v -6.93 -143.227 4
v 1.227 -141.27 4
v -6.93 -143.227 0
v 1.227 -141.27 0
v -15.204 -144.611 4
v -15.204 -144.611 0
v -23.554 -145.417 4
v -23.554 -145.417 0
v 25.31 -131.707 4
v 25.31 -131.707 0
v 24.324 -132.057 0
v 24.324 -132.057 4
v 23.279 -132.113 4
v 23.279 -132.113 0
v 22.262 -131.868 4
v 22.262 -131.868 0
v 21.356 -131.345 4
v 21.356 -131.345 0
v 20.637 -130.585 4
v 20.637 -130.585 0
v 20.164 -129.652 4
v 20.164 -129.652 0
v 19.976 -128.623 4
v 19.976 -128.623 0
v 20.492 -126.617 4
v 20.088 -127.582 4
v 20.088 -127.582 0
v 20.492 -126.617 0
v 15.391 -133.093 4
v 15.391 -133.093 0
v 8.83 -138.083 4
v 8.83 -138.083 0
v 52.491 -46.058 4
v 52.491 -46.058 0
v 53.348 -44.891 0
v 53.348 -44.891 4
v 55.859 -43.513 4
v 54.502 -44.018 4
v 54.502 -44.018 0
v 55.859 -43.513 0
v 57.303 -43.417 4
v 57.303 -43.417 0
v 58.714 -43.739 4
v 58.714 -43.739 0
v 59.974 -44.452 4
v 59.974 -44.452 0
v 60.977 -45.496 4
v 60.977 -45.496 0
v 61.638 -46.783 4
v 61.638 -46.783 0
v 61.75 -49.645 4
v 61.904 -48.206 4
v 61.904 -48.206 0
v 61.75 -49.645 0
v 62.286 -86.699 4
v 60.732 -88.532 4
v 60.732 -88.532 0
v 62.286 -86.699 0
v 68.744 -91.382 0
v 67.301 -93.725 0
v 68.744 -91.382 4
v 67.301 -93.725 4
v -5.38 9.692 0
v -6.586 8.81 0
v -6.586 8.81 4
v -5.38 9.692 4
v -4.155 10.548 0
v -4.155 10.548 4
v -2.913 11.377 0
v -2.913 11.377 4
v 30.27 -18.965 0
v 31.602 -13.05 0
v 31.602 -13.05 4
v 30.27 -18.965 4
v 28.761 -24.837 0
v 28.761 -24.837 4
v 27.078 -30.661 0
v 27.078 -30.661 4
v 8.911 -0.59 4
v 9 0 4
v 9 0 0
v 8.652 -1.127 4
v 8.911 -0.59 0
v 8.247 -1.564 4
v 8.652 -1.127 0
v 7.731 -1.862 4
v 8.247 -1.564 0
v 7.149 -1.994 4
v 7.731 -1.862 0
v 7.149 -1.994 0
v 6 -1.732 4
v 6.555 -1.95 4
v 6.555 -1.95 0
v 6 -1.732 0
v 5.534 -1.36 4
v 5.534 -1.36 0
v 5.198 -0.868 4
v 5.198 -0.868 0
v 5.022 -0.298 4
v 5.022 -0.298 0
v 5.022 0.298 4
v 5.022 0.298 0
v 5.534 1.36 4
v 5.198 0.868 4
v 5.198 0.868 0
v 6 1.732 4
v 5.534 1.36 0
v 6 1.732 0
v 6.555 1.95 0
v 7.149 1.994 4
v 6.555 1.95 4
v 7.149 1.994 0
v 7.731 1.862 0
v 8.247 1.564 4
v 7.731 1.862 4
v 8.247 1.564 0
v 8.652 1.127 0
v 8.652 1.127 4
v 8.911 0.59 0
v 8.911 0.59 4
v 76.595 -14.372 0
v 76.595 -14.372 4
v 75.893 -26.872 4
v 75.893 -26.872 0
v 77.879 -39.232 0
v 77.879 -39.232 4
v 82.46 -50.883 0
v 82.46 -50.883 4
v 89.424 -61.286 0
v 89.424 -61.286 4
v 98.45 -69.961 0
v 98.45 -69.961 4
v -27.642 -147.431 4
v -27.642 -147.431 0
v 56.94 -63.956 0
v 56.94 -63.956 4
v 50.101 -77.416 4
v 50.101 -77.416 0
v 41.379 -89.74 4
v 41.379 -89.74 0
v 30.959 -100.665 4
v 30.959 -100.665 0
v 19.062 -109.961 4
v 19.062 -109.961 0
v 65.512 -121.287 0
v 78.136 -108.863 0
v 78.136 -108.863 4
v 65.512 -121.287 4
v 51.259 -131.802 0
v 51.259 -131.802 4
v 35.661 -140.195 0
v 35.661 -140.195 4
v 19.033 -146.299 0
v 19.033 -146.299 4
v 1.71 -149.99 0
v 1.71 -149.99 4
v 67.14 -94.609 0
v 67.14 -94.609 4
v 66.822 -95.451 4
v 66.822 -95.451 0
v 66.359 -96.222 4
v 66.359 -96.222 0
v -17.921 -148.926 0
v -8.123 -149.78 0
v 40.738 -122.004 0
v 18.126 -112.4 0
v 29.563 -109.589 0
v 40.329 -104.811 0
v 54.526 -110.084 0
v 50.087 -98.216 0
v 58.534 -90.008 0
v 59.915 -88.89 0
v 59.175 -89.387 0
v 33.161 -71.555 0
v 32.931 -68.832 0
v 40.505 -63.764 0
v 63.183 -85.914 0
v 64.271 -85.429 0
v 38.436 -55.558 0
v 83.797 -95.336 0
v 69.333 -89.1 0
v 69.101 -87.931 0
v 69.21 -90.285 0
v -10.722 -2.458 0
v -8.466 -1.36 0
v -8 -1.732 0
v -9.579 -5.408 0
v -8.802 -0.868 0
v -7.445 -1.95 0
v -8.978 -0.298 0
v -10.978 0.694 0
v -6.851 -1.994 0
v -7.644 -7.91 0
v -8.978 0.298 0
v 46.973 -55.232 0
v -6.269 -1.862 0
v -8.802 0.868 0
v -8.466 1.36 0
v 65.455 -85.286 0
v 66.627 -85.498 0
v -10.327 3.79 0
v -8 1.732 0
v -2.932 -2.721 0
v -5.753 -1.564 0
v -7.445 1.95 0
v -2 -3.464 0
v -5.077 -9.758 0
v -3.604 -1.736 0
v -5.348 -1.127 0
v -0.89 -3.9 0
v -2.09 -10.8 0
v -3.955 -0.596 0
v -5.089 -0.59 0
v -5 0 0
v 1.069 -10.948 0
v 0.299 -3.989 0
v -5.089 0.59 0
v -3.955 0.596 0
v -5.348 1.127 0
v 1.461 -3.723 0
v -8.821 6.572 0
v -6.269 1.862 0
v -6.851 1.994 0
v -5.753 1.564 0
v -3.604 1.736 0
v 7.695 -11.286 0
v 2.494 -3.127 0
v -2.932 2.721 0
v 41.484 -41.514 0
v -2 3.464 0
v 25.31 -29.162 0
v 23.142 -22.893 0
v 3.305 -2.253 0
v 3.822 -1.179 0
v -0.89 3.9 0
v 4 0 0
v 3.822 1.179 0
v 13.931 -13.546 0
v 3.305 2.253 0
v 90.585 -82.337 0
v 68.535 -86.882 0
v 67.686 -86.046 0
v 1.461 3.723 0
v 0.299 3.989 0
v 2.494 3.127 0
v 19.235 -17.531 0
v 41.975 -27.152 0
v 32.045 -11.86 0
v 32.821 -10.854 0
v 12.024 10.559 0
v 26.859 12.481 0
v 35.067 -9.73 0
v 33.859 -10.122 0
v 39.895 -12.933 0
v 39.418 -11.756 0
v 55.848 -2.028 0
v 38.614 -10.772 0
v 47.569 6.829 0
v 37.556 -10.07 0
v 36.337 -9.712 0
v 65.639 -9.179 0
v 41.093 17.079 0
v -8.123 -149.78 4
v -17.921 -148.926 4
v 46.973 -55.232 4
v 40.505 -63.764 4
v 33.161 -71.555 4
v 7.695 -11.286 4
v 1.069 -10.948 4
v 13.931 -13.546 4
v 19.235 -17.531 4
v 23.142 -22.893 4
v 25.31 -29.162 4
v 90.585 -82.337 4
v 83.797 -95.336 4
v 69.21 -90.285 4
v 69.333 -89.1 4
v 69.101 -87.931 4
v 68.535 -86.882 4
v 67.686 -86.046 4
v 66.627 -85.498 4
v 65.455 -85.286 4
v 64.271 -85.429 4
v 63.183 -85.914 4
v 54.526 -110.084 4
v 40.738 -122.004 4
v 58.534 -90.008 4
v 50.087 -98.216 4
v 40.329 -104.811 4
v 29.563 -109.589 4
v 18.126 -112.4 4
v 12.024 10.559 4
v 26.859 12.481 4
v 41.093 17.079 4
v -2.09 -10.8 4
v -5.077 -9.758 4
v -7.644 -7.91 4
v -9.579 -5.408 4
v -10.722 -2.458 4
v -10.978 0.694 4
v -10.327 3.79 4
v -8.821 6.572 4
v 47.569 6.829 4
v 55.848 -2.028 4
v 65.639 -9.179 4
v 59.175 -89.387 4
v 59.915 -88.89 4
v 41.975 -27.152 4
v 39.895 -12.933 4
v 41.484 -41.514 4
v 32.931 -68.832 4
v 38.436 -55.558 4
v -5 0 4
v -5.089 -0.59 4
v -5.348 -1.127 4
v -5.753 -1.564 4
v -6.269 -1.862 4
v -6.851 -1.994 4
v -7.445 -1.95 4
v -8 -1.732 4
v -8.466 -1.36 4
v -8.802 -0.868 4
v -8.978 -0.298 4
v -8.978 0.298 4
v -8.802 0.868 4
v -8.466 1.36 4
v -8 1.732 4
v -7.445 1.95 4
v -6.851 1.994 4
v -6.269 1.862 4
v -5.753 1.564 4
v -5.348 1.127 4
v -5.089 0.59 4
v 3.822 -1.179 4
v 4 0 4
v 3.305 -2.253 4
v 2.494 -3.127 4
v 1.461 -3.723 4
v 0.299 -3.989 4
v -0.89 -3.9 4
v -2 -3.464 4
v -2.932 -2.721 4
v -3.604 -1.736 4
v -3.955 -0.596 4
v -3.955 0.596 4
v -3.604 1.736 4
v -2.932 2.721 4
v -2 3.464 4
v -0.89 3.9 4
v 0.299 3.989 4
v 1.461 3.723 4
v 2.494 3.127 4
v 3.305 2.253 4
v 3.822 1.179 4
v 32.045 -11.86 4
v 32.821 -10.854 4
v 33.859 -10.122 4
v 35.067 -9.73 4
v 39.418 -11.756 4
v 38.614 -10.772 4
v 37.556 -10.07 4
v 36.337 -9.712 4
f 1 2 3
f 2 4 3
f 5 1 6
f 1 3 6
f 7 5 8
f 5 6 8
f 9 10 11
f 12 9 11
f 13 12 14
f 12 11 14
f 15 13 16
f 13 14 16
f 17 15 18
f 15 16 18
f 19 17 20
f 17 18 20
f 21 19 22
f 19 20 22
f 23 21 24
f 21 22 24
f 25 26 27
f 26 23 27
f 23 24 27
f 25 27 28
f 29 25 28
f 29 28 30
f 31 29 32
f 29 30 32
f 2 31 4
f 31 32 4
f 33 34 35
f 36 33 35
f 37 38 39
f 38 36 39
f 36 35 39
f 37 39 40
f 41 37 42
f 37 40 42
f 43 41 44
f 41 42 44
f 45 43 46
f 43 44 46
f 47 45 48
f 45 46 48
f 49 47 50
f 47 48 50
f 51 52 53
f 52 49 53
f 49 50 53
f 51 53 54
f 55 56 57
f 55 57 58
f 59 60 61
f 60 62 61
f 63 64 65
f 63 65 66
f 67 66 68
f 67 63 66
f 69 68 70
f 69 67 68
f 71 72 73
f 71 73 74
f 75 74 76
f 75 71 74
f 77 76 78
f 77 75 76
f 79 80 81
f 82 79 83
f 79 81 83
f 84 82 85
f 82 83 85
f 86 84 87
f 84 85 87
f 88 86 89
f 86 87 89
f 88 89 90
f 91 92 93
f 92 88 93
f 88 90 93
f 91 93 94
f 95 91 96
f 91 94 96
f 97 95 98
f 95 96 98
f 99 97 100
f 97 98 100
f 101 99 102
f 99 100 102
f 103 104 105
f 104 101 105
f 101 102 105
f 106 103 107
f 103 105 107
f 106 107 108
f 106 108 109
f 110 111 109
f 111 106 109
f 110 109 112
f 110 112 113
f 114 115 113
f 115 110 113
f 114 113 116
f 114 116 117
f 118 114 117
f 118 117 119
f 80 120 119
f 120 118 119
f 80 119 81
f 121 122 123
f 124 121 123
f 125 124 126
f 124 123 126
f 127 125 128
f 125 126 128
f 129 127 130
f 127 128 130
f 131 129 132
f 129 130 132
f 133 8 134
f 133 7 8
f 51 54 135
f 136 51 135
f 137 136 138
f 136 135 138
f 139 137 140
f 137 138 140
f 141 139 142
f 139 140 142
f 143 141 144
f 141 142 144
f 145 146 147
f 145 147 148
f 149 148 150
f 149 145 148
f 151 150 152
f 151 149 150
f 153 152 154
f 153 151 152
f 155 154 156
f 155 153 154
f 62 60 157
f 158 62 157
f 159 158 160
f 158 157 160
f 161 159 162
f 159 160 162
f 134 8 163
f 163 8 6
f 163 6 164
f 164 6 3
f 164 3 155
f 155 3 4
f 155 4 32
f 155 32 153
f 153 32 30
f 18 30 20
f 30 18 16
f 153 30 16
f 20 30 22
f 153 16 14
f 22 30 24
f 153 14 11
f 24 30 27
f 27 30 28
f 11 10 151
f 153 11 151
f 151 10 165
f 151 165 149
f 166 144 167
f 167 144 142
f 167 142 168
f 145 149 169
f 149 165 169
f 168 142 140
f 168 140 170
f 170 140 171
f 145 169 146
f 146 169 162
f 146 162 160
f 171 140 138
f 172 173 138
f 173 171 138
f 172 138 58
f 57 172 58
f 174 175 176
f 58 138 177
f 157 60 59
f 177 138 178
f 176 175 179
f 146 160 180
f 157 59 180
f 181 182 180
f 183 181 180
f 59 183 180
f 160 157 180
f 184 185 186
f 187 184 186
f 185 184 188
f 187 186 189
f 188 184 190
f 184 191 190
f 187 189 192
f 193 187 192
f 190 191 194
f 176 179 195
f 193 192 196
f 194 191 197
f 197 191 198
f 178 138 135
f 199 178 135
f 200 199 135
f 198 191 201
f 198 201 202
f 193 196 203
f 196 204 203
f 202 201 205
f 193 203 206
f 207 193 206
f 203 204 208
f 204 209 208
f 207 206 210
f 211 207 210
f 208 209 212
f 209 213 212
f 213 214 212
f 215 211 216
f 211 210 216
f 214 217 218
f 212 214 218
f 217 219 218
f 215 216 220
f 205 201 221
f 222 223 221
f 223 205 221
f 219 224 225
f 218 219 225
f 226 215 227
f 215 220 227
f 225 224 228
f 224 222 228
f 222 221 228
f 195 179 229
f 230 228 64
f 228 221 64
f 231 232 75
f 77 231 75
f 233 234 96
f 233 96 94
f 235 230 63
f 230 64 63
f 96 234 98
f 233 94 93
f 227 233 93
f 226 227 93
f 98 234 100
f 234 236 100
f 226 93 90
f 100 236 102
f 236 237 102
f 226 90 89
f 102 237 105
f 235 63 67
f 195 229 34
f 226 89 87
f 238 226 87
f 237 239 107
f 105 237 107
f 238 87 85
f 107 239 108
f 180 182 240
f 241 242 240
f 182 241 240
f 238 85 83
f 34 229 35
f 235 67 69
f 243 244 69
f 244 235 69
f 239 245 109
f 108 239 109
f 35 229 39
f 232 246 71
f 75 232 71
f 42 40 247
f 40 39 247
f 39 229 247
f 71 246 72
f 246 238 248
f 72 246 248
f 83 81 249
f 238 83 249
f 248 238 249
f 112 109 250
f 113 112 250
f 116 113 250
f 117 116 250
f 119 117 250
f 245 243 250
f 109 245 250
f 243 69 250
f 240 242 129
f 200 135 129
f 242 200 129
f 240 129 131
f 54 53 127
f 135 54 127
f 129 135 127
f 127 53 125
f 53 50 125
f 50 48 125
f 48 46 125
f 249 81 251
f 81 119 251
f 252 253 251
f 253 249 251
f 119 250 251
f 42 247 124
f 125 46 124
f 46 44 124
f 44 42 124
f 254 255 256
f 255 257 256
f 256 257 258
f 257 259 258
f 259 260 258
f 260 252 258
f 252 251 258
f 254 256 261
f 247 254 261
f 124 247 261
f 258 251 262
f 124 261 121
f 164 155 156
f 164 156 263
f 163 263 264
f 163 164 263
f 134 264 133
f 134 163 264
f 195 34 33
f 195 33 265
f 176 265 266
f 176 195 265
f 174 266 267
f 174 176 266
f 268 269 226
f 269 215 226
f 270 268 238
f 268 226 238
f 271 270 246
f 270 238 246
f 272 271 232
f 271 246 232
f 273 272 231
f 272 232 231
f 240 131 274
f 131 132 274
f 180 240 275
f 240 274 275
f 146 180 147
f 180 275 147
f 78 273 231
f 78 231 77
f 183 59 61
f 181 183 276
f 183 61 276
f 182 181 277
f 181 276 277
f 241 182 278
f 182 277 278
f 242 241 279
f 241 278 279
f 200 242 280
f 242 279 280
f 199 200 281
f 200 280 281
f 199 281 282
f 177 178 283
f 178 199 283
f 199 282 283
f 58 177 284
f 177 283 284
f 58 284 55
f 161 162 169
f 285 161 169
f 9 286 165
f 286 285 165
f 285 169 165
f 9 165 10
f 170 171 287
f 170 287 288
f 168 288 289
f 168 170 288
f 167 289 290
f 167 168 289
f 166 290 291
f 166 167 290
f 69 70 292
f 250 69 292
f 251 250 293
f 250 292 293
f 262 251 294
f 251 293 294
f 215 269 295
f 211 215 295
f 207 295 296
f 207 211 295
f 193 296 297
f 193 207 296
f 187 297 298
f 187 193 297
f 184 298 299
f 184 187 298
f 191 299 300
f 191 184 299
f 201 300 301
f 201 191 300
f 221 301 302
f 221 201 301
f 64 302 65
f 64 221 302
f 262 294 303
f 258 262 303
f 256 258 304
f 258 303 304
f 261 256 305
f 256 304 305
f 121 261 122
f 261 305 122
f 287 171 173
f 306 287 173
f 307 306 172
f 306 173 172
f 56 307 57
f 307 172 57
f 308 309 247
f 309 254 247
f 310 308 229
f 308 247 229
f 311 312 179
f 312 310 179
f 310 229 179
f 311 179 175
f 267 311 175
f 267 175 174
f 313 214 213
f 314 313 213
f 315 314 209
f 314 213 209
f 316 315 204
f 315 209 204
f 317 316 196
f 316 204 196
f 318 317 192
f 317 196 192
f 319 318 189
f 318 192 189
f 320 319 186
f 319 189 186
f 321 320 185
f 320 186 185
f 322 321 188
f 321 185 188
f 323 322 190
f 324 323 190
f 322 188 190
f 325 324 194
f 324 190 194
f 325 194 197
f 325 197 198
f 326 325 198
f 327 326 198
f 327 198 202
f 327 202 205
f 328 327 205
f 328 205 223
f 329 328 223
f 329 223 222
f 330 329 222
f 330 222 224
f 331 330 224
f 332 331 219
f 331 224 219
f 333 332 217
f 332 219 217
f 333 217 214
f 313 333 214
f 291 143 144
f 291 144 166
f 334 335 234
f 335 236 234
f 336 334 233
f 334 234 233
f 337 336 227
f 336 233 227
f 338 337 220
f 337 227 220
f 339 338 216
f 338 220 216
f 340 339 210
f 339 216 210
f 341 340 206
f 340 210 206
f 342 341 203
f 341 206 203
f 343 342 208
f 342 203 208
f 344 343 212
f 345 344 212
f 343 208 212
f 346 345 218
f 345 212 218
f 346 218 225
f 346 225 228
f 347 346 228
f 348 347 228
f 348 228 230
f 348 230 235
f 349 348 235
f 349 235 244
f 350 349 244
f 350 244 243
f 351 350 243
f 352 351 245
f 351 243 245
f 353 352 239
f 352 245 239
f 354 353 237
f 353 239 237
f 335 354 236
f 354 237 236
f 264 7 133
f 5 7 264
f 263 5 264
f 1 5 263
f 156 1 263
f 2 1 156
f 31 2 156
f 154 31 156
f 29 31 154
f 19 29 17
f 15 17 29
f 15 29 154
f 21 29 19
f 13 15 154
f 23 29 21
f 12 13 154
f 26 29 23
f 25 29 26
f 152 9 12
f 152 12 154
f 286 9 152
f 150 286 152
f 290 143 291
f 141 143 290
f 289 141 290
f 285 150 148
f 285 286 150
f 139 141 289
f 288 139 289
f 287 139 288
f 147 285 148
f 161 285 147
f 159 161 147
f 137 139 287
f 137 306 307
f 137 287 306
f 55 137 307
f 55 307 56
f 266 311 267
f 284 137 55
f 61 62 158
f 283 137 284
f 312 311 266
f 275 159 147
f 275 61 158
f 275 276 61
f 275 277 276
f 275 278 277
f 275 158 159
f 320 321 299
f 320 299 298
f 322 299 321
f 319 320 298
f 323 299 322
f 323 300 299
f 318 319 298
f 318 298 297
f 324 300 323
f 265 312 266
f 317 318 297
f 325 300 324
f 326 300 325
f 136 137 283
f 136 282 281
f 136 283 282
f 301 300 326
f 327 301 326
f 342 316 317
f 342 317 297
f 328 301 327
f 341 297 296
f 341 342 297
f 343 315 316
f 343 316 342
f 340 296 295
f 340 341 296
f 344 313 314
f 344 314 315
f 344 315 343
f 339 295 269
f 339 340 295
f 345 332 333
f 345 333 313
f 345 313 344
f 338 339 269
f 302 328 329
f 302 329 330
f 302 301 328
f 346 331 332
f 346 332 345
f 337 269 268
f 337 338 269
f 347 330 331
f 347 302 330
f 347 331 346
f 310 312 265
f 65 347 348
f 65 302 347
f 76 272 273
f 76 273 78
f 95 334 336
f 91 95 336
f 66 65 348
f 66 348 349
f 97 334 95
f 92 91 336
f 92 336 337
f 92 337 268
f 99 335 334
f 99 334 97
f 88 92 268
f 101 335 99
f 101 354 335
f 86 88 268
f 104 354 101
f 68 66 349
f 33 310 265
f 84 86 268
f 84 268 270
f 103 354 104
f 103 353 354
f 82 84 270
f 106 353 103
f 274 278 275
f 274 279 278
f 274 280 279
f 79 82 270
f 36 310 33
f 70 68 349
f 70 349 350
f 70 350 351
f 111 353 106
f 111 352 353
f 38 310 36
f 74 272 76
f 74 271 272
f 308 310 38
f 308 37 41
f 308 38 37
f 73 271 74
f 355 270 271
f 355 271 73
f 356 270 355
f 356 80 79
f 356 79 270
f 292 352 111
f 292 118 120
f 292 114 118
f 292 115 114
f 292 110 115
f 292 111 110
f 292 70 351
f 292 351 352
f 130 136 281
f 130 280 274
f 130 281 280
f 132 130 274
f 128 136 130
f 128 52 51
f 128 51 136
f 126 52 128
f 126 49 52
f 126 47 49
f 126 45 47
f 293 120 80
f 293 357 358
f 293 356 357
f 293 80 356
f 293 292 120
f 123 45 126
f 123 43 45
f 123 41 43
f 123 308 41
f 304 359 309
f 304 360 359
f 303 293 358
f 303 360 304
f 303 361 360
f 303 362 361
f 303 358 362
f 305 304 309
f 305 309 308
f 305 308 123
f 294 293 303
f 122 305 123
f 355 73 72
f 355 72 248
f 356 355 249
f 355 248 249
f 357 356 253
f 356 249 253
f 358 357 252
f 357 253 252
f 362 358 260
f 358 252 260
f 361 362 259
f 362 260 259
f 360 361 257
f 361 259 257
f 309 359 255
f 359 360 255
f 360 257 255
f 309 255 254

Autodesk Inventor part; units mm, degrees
ref_plane "YZ Plane" through (0, 0, 0) normal (1, 0, 0) x (0, 1, 0)
ref_plane "XZ Plane" through (0, 0, 0) normal (0, 1, 0) x (-1, 0, 0)
ref_plane "XY Plane" through (0, 0, 0) normal (0, 0, 1) x (1, 0, 0)
sketch "スケッチ1" plane through (0, 0, 0) normal (0, 0, 1) x (1, 0, 0)
  circle A0 centre (0, 0) radius 4
  arc A1 (-36.3828, -145.5208) -> (1.7098, -149.9903) centre (0, 0) ccw
  arc A2 (-36.3828, -145.5208) -> (66.3592, -96.2219) centre (-30.943, -25.1476) ccw
  arc A3 (14.4829, -112.8585) -> (61.7505, -49.6452) centre (-38.6267, -23.8672) ccw
  arc A4 (14.4829, -112.8585) -> (58.5345, -90.0081) centre (7.974, -46.4235) ccw
  arc A5 (66.3592, -96.2219) -> (58.5345, -90.0081) centre (62.3217, -93.2727) ccw
  arc A6 (1.2269, -141.2699) -> (20.4921, -126.6173) centre (-7.4844, -109.8252) ccw
  arc A7 (20.4921, -126.6173) -> (25.3099, -131.707) centre (23.6114, -128.4896) ccw
  arc A8 (1.7098, -149.9903) -> (99.9398, -73.8138) centre (-15.6029, -26.2431) ccw
  arc A9 (99.9398, -73.8138) -> (-6.5865, 8.8101) centre (35.2818, -47.1931) ccw
  circle A10 centre (0, 0) radius 11
  circle A11 centre (0, 0) radius 7
  circle A12 centre (-7, 0) radius 2
  circle A13 centre (7, 0) radius 2
  arc A14 (25.6, -35.3039) -> (1.0693, -10.9479) centre (3.2508, -33.2821) ccw
  arc A15 (25.6, -35.3039) -> (31.6019, -13.0505) centre (-166.9688, 28.5691) ccw
  arc A16 (39.8947, -12.9328) -> (31.6019, -13.0505) centre (35.7615, -13.9224) ccw
  arc A17 (29.3196, -75.0304) -> (39.8947, -12.9328) centre (-38.0836, -31.6026) ccw
  arc A18 (29.3196, -75.0304) -> (52.4911, -46.0576) centre (-35.7899, 0.7942) ccw
  arc A19 (61.7505, -49.6452) -> (52.4911, -46.0576) centre (56.9076, -48.4015) ccw
  line L0 (-7, 0) -> (7, 0)
  dimension "d0" = 8
  dimension "d1" = 300
  dimension "d2" = 10
  dimension "d3" = 7
  dimension "d4" = 3
  dimension "d5" = 4
  dimension "d6" = 4
  dimension "d7" = 8.5
  dimension "d8" = 10
extrude "押し出し1" add sketch "スケッチ1" along normal blind 4 contours L0 A13 A11 A12 A0 | A0 L0 A12 A11 A13 | A2 A5 A4 A3 A19 A18 A17 A16 A15 A14 A10 A9 A8 A1 | A6 A7 A2 | A10
sketch "スケッチ2" plane through (0, 0, 4) normal (0, 0, 1) x (1, 0, 0)
  arc A0 (99.9398, -73.8138) -> (-6.5865, 8.8101) centre (35.2818, -47.1931) ccw projected
  arc A1 (-6.5865, 8.8101) -> (1.0693, -10.9479) centre (0, 0) ccw projected
  arc A2 (25.6, -35.3039) -> (1.0693, -10.9479) centre (3.2508, -33.2821) ccw projected
  arc A3 (25.6, -35.3039) -> (31.6019, -13.0505) centre (-166.9688, 28.5691) ccw projected
  arc A4 (39.8947, -12.9328) -> (31.6019, -13.0505) centre (35.7615, -13.9224) ccw projected
  arc A5 (29.3196, -75.0304) -> (39.8947, -12.9328) centre (-38.0836, -31.6026) ccw projected
  arc A6 (29.3196, -75.0304) -> (52.4911, -46.0576) centre (-35.7899, 0.7942) ccw projected
  arc A7 (61.7505, -49.6452) -> (52.4911, -46.0576) centre (56.9076, -48.4015) ccw projected
  arc A8 (14.4829, -112.8585) -> (61.7505, -49.6452) centre (-38.6267, -23.8672) ccw projected
  arc A9 (14.4829, -112.8585) -> (58.5345, -90.0081) centre (7.974, -46.4235) ccw projected
  arc A10 (66.3592, -96.2219) -> (58.5345, -90.0081) centre (62.3217, -93.2727) ccw projected
  arc A11 (25.3099, -131.707) -> (66.3592, -96.2219) centre (-30.943, -25.1476) ccw projected
  arc A12 (20.4921, -126.6173) -> (25.3099, -131.707) centre (23.6114, -128.4896) ccw projected
  arc A13 (1.2269, -141.2699) -> (20.4921, -126.6173) centre (-7.4844, -109.8252) ccw projected
  arc A14 (-36.3828, -145.5208) -> (1.2269, -141.2699) centre (-30.943, -25.1476) ccw projected
  arc A15 (-36.3828, -145.5208) -> (1.7098, -149.9903) centre (0, 0) ccw projected
  arc A16 (1.7098, -149.9903) -> (99.9398, -73.8138) centre (-15.6029, -26.2431) ccw projected
  circle A17 centre (7, 0) radius 2 projected
  circle A18 centre (0, 0) radius 4 projected
  circle A19 centre (-7, 0) radius 2 projected
  circle A20 centre (65.3374, -89.2845) radius 4
  arc A21 (66.3592, -96.2219) -> (58.5345, -90.0081) centre (62.3217, -93.2727) ccw projected
  line L0 (60.732, -88.5321) -> (62.2857, -86.6986)
  line L1 (67.3012, -93.7246) -> (68.7437, -91.3815)
  arc A22 (14.4829, -112.8585) -> (58.5345, -90.0081) centre (7.974, -46.4235) ccw projected
  arc A23 (25.3099, -131.707) -> (66.3592, -96.2219) centre (-30.943, -25.1476) ccw projected
  arc A24 (99.9398, -73.8138) -> (-6.5865, 8.8101) centre (35.2818, -47.1931) ccw projected
  arc A25 (82.9132, 3.9984) -> (100.781, -71.6713) centre (134.0667, -23.8672) ccw
  arc A26 (103.3216, -63.3146) -> (78.1365, -108.8628) centre (240.1923, -168.732) ccw
  arc A27 (-2.9127, 11.3773) -> (49.5081, 21.2681) centre (9, 92.0999) ccw
  line L2 (-23.554, -145.4168) -> (-27.6421, -147.431)
  line L3 (19.0618, -109.9609) -> (18.1257, -112.4002)
  arc A28 (29.3196, -75.0304) -> (39.8947, -12.9328) centre (-38.0836, -31.6026) ccw projected
  line L4 (32.9312, -68.8325) -> (33.161, -71.5549)
  line L5 (25.3099, -29.1624) -> (27.0784, -30.661)
  arc A29 (99.9398, -73.8138) -> (-6.5865, 8.8101) centre (35.2818, -47.1931) ccw projected
  arc A30 (38.5914, 22.6522) -> (98.9338, -18.2494) centre (98.6238, 46.2558) ccw
  point P0 (60.732, -88.5321)
  point P1 (61.4482, -88.3496)
  point P2 (67.2965, -92.7719)
  point P3 (67.3012, -93.7246)
  point P4 (103.3216, -63.3146)
  point P5 (82.9132, 3.9984)
  point P6 (100.781, -71.6713)
  point P7 (-2.9127, 11.3773)
  point P8 (49.5081, 21.2681)
  point P9 (38.5914, 22.6522)
  point P10 (98.9338, -18.2494)
  dimension "d11" = 8
extrude "押し出し2" cut sketch "スケッチ2" against normal blind 4 contours A16 A26 A25 A0 | A25 A26 A0 | A26 A25 A30 A0 | A30 A25 A0 | A30 A27 A0 A25 | A15 A14 L2 | A30 A0 A27 | A27 A0 A30 | L5 A3 A2 | A10 A20 L1 | A20 A10 | A10 A20 | A10 L0 A20 | L4 A6 A5 | A9 A8 L3
properties part number "横回転鎌" material "アルミニウム 7075"
